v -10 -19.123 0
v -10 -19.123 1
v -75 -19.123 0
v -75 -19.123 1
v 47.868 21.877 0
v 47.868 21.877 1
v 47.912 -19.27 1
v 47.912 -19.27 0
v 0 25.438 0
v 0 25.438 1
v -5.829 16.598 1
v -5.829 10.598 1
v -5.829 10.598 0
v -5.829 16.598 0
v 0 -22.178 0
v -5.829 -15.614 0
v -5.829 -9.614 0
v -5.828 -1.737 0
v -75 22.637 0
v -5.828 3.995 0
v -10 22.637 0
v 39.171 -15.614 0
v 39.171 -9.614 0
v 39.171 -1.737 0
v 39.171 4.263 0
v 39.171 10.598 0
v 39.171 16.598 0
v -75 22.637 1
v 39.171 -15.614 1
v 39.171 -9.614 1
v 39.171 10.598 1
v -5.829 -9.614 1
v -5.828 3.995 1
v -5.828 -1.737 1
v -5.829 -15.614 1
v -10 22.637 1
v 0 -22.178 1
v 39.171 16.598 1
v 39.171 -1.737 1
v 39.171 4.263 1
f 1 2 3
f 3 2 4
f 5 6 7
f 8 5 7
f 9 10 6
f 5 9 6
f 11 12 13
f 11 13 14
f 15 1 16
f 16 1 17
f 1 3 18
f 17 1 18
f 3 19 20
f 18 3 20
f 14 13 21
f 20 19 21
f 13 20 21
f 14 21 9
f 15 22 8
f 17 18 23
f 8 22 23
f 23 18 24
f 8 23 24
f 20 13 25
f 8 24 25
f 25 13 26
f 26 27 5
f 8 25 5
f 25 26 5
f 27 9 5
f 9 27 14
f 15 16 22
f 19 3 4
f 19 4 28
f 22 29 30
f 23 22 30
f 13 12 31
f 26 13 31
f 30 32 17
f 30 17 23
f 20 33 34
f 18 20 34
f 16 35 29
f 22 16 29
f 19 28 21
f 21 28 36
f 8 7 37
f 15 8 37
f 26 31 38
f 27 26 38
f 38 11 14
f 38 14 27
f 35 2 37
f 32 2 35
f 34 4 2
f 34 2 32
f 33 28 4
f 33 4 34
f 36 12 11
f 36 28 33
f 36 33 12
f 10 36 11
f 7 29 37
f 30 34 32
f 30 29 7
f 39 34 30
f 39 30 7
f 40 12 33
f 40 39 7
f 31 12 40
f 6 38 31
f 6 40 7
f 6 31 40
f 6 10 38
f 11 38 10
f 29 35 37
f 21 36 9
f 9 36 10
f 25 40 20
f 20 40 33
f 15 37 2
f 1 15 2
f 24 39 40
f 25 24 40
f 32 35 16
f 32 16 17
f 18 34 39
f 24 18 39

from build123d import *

# Parameters (mm, degrees)
F0_W     = 150
F0_H     = 99
F1_DEPTH = 1
F2_W     = 45
F2_H     = 6
F3_DEPTH = 25


with BuildPart() as f1:
    # F0 (on Top) → F1 (new body)
    with BuildSketch(Plane.XY):
        Rectangle(F0_W, F0_H)
    extrude(amount=F1_DEPTH)

    # F2 (on face) → F3 (cut)
    with BuildSketch(Plane.XY.offset(1)):
        with Locations((16.671137, 13.597774)):
            Rectangle(F2_W, F2_H)
        Polygon((39.171137, -1.737237), (39.171137, 4.262763), (-5.828066, 3.994909), (-5.828066, -1.737237), align=None)
        with Locations((16.671137, -12.613959)):
            Rectangle(F2_W, F2_H)
        Polygon((-75, 49.5), (-75, 22.636687), (-10, 22.636687), (0, 25.437629), (47.867719, 21.876522), (47.911783, -19.269578), (0, -22.178359), (-10, -19.122791), (-75, -19.122791), (-75, -49.5), (75, -49.5), (75, 49.5), align=None)
    extrude(amount=-F3_DEPTH, mode=Mode.SUBTRACT)


solid = f1.part
